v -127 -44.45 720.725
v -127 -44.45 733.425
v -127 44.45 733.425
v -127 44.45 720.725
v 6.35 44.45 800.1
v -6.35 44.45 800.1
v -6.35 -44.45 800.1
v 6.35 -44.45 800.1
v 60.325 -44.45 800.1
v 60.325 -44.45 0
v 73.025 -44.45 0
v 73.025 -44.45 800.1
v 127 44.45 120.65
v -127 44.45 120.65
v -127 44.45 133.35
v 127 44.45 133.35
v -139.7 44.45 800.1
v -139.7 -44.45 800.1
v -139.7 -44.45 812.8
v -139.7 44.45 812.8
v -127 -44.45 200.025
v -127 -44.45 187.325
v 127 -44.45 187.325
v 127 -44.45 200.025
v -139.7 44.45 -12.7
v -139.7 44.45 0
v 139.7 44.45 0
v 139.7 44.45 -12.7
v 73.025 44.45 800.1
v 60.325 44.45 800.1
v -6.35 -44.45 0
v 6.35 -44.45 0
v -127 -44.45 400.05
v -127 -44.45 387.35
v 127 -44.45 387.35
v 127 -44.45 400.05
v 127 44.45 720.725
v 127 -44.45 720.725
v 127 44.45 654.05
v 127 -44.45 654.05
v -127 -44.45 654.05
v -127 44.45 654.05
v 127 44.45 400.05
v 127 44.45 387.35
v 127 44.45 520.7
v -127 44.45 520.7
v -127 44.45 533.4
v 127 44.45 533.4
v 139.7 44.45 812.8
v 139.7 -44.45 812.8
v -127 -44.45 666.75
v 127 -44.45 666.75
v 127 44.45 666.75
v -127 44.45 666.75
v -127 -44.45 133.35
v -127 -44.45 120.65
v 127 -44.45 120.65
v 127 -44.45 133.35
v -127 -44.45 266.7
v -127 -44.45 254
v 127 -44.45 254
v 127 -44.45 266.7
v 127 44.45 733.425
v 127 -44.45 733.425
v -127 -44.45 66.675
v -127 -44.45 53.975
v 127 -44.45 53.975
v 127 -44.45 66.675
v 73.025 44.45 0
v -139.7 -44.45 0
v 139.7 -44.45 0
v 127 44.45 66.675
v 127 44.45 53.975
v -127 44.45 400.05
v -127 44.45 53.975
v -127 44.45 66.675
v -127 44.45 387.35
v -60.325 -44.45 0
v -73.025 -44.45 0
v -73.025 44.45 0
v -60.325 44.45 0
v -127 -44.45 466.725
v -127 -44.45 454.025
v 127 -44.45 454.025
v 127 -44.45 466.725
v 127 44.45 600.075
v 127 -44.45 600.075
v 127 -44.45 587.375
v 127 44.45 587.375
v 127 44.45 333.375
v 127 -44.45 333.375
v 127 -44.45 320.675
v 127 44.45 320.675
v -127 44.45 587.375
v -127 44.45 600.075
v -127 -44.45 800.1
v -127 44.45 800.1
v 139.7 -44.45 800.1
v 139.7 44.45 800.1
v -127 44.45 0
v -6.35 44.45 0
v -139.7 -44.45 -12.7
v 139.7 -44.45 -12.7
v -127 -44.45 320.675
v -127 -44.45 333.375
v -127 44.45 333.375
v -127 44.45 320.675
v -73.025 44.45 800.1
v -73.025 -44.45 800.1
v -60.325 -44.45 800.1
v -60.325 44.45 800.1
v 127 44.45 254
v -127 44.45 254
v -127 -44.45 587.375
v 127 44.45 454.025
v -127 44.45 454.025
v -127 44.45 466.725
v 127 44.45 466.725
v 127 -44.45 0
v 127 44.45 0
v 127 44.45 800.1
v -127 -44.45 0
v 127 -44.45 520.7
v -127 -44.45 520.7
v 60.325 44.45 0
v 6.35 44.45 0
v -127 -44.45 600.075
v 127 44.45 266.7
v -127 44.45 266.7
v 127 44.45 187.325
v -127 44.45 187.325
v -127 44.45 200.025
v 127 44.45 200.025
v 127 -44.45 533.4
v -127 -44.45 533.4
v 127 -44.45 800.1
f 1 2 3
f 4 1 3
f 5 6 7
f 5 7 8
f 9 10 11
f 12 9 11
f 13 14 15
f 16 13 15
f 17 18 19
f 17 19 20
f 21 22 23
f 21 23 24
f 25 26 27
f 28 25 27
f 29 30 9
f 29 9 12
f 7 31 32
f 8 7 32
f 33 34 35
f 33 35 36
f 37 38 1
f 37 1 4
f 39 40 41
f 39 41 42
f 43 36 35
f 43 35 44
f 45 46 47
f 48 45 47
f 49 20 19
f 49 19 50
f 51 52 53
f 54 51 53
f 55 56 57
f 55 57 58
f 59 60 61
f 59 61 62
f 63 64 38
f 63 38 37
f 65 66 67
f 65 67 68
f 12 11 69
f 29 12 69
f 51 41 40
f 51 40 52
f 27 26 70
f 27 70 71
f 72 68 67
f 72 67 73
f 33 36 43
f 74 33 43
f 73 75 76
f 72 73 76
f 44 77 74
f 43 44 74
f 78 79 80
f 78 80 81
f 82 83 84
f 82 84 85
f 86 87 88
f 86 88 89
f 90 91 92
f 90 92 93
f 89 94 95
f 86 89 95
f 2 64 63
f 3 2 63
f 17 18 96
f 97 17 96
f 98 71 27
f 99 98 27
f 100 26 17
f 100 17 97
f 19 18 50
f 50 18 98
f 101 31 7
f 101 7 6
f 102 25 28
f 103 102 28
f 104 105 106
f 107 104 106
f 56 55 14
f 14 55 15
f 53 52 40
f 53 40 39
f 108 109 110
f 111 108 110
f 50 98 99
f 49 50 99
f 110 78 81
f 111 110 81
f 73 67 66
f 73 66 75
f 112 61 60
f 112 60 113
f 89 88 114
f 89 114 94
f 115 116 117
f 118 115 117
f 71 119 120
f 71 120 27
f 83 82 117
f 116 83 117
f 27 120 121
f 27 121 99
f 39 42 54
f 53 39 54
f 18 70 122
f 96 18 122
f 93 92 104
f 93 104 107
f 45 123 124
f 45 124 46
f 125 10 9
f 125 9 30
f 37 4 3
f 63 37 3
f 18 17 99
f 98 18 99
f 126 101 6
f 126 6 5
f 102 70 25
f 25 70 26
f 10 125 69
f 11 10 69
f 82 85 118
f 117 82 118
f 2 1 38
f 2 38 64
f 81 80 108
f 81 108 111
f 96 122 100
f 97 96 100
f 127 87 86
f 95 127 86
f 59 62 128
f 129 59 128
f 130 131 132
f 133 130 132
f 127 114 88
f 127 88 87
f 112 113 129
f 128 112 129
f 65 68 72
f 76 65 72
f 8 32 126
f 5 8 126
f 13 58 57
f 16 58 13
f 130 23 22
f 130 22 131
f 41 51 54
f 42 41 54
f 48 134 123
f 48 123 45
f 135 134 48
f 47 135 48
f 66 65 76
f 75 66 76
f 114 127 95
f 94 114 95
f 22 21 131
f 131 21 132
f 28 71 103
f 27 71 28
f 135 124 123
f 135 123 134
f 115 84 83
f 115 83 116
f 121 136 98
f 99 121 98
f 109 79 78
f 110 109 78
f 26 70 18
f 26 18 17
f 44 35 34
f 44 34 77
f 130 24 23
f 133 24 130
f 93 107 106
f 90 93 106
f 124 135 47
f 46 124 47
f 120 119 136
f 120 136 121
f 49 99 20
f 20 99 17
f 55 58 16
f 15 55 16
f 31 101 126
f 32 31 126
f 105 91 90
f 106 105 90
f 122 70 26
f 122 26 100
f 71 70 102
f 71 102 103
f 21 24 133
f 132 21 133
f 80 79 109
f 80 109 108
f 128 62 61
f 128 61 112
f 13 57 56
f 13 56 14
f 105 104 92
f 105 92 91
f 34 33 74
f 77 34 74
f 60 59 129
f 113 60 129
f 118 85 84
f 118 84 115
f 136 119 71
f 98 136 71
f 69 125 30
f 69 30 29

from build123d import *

# Parameters (mm, degrees)
F0_W     = 12.7
F0_H     = 88.9
F1_DEPTH = 800.1
F2_W     = 279.4
F2_H     = 88.9
F3_DEPTH = 12.7
F4_W     = 88.9
F4_H     = 12.7
F5_DEPTH = 254
F6_W     = 12.7
F6_H     = 88.9
F6_W_2   = 266.7
F7_DEPTH = 12.7


with BuildPart() as f1:
    # F0 (on Top) → F1 (new body)
    with BuildSketch(Plane.XY):
        with Locations((-133.35, 0)):
            Rectangle(F0_W, F0_H)
        with Locations((-66.675, 0)):
            Rectangle(F0_W, F0_H)
        Rectangle(F0_W, F0_H)
        with Locations((133.35, 0)):
            Rectangle(F0_W, F0_H)
        with Locations((66.675, 0)):
            Rectangle(F0_W, F0_H)
    extrude(amount=F1_DEPTH)


with BuildPart() as f3:
    # F2 (on Top) → F3 (new body)
    with BuildSketch(Plane.XY):
        Rectangle(F2_W, F2_H)
    extrude(amount=-F3_DEPTH)


with BuildPart() as f5:
    # F4 (on face) → F5 (new body)
    with BuildSketch(Plane.YZ.offset(-127)):
        with Locations((0, 727.075)):
            Rectangle(F4_W, F4_H)
        with Locations((0, 660.4)):
            Rectangle(F4_W, F4_H)
        with Locations((0, 593.725)):
            Rectangle(F4_W, F4_H)
        with Locations((0, 527.05)):
            Rectangle(F4_W, F4_H)
        with Locations((0, 460.375)):
            Rectangle(F4_W, F4_H)
        with Locations((0, 393.7)):
            Rectangle(F4_W, F4_H)
        with Locations((0, 327.025)):
            Rectangle(F4_W, F4_H)
        with Locations((0, 260.35)):
            Rectangle(F4_W, F4_H)
        with Locations((0, 193.675)):
            Rectangle(F4_W, F4_H)
        with Locations((0, 127)):
            Rectangle(F4_W, F4_H)
        with Locations((0, 60.325)):
            Rectangle(F4_W, F4_H)
    extrude(amount=F5_DEPTH)


with BuildPart() as f7:
    # F6 (on face) → F7 (new body)
    with BuildSketch(Plane.XY.offset(800.1)):
        with Locations((-133.35, 0)):
            Rectangle(F6_W, F6_H)
        with Locations((6.35, 0)):
            Rectangle(F6_W_2, F6_H)
    extrude(amount=F7_DEPTH)


solid = Compound([f1.part, f3.part, f5.part, f7.part])
